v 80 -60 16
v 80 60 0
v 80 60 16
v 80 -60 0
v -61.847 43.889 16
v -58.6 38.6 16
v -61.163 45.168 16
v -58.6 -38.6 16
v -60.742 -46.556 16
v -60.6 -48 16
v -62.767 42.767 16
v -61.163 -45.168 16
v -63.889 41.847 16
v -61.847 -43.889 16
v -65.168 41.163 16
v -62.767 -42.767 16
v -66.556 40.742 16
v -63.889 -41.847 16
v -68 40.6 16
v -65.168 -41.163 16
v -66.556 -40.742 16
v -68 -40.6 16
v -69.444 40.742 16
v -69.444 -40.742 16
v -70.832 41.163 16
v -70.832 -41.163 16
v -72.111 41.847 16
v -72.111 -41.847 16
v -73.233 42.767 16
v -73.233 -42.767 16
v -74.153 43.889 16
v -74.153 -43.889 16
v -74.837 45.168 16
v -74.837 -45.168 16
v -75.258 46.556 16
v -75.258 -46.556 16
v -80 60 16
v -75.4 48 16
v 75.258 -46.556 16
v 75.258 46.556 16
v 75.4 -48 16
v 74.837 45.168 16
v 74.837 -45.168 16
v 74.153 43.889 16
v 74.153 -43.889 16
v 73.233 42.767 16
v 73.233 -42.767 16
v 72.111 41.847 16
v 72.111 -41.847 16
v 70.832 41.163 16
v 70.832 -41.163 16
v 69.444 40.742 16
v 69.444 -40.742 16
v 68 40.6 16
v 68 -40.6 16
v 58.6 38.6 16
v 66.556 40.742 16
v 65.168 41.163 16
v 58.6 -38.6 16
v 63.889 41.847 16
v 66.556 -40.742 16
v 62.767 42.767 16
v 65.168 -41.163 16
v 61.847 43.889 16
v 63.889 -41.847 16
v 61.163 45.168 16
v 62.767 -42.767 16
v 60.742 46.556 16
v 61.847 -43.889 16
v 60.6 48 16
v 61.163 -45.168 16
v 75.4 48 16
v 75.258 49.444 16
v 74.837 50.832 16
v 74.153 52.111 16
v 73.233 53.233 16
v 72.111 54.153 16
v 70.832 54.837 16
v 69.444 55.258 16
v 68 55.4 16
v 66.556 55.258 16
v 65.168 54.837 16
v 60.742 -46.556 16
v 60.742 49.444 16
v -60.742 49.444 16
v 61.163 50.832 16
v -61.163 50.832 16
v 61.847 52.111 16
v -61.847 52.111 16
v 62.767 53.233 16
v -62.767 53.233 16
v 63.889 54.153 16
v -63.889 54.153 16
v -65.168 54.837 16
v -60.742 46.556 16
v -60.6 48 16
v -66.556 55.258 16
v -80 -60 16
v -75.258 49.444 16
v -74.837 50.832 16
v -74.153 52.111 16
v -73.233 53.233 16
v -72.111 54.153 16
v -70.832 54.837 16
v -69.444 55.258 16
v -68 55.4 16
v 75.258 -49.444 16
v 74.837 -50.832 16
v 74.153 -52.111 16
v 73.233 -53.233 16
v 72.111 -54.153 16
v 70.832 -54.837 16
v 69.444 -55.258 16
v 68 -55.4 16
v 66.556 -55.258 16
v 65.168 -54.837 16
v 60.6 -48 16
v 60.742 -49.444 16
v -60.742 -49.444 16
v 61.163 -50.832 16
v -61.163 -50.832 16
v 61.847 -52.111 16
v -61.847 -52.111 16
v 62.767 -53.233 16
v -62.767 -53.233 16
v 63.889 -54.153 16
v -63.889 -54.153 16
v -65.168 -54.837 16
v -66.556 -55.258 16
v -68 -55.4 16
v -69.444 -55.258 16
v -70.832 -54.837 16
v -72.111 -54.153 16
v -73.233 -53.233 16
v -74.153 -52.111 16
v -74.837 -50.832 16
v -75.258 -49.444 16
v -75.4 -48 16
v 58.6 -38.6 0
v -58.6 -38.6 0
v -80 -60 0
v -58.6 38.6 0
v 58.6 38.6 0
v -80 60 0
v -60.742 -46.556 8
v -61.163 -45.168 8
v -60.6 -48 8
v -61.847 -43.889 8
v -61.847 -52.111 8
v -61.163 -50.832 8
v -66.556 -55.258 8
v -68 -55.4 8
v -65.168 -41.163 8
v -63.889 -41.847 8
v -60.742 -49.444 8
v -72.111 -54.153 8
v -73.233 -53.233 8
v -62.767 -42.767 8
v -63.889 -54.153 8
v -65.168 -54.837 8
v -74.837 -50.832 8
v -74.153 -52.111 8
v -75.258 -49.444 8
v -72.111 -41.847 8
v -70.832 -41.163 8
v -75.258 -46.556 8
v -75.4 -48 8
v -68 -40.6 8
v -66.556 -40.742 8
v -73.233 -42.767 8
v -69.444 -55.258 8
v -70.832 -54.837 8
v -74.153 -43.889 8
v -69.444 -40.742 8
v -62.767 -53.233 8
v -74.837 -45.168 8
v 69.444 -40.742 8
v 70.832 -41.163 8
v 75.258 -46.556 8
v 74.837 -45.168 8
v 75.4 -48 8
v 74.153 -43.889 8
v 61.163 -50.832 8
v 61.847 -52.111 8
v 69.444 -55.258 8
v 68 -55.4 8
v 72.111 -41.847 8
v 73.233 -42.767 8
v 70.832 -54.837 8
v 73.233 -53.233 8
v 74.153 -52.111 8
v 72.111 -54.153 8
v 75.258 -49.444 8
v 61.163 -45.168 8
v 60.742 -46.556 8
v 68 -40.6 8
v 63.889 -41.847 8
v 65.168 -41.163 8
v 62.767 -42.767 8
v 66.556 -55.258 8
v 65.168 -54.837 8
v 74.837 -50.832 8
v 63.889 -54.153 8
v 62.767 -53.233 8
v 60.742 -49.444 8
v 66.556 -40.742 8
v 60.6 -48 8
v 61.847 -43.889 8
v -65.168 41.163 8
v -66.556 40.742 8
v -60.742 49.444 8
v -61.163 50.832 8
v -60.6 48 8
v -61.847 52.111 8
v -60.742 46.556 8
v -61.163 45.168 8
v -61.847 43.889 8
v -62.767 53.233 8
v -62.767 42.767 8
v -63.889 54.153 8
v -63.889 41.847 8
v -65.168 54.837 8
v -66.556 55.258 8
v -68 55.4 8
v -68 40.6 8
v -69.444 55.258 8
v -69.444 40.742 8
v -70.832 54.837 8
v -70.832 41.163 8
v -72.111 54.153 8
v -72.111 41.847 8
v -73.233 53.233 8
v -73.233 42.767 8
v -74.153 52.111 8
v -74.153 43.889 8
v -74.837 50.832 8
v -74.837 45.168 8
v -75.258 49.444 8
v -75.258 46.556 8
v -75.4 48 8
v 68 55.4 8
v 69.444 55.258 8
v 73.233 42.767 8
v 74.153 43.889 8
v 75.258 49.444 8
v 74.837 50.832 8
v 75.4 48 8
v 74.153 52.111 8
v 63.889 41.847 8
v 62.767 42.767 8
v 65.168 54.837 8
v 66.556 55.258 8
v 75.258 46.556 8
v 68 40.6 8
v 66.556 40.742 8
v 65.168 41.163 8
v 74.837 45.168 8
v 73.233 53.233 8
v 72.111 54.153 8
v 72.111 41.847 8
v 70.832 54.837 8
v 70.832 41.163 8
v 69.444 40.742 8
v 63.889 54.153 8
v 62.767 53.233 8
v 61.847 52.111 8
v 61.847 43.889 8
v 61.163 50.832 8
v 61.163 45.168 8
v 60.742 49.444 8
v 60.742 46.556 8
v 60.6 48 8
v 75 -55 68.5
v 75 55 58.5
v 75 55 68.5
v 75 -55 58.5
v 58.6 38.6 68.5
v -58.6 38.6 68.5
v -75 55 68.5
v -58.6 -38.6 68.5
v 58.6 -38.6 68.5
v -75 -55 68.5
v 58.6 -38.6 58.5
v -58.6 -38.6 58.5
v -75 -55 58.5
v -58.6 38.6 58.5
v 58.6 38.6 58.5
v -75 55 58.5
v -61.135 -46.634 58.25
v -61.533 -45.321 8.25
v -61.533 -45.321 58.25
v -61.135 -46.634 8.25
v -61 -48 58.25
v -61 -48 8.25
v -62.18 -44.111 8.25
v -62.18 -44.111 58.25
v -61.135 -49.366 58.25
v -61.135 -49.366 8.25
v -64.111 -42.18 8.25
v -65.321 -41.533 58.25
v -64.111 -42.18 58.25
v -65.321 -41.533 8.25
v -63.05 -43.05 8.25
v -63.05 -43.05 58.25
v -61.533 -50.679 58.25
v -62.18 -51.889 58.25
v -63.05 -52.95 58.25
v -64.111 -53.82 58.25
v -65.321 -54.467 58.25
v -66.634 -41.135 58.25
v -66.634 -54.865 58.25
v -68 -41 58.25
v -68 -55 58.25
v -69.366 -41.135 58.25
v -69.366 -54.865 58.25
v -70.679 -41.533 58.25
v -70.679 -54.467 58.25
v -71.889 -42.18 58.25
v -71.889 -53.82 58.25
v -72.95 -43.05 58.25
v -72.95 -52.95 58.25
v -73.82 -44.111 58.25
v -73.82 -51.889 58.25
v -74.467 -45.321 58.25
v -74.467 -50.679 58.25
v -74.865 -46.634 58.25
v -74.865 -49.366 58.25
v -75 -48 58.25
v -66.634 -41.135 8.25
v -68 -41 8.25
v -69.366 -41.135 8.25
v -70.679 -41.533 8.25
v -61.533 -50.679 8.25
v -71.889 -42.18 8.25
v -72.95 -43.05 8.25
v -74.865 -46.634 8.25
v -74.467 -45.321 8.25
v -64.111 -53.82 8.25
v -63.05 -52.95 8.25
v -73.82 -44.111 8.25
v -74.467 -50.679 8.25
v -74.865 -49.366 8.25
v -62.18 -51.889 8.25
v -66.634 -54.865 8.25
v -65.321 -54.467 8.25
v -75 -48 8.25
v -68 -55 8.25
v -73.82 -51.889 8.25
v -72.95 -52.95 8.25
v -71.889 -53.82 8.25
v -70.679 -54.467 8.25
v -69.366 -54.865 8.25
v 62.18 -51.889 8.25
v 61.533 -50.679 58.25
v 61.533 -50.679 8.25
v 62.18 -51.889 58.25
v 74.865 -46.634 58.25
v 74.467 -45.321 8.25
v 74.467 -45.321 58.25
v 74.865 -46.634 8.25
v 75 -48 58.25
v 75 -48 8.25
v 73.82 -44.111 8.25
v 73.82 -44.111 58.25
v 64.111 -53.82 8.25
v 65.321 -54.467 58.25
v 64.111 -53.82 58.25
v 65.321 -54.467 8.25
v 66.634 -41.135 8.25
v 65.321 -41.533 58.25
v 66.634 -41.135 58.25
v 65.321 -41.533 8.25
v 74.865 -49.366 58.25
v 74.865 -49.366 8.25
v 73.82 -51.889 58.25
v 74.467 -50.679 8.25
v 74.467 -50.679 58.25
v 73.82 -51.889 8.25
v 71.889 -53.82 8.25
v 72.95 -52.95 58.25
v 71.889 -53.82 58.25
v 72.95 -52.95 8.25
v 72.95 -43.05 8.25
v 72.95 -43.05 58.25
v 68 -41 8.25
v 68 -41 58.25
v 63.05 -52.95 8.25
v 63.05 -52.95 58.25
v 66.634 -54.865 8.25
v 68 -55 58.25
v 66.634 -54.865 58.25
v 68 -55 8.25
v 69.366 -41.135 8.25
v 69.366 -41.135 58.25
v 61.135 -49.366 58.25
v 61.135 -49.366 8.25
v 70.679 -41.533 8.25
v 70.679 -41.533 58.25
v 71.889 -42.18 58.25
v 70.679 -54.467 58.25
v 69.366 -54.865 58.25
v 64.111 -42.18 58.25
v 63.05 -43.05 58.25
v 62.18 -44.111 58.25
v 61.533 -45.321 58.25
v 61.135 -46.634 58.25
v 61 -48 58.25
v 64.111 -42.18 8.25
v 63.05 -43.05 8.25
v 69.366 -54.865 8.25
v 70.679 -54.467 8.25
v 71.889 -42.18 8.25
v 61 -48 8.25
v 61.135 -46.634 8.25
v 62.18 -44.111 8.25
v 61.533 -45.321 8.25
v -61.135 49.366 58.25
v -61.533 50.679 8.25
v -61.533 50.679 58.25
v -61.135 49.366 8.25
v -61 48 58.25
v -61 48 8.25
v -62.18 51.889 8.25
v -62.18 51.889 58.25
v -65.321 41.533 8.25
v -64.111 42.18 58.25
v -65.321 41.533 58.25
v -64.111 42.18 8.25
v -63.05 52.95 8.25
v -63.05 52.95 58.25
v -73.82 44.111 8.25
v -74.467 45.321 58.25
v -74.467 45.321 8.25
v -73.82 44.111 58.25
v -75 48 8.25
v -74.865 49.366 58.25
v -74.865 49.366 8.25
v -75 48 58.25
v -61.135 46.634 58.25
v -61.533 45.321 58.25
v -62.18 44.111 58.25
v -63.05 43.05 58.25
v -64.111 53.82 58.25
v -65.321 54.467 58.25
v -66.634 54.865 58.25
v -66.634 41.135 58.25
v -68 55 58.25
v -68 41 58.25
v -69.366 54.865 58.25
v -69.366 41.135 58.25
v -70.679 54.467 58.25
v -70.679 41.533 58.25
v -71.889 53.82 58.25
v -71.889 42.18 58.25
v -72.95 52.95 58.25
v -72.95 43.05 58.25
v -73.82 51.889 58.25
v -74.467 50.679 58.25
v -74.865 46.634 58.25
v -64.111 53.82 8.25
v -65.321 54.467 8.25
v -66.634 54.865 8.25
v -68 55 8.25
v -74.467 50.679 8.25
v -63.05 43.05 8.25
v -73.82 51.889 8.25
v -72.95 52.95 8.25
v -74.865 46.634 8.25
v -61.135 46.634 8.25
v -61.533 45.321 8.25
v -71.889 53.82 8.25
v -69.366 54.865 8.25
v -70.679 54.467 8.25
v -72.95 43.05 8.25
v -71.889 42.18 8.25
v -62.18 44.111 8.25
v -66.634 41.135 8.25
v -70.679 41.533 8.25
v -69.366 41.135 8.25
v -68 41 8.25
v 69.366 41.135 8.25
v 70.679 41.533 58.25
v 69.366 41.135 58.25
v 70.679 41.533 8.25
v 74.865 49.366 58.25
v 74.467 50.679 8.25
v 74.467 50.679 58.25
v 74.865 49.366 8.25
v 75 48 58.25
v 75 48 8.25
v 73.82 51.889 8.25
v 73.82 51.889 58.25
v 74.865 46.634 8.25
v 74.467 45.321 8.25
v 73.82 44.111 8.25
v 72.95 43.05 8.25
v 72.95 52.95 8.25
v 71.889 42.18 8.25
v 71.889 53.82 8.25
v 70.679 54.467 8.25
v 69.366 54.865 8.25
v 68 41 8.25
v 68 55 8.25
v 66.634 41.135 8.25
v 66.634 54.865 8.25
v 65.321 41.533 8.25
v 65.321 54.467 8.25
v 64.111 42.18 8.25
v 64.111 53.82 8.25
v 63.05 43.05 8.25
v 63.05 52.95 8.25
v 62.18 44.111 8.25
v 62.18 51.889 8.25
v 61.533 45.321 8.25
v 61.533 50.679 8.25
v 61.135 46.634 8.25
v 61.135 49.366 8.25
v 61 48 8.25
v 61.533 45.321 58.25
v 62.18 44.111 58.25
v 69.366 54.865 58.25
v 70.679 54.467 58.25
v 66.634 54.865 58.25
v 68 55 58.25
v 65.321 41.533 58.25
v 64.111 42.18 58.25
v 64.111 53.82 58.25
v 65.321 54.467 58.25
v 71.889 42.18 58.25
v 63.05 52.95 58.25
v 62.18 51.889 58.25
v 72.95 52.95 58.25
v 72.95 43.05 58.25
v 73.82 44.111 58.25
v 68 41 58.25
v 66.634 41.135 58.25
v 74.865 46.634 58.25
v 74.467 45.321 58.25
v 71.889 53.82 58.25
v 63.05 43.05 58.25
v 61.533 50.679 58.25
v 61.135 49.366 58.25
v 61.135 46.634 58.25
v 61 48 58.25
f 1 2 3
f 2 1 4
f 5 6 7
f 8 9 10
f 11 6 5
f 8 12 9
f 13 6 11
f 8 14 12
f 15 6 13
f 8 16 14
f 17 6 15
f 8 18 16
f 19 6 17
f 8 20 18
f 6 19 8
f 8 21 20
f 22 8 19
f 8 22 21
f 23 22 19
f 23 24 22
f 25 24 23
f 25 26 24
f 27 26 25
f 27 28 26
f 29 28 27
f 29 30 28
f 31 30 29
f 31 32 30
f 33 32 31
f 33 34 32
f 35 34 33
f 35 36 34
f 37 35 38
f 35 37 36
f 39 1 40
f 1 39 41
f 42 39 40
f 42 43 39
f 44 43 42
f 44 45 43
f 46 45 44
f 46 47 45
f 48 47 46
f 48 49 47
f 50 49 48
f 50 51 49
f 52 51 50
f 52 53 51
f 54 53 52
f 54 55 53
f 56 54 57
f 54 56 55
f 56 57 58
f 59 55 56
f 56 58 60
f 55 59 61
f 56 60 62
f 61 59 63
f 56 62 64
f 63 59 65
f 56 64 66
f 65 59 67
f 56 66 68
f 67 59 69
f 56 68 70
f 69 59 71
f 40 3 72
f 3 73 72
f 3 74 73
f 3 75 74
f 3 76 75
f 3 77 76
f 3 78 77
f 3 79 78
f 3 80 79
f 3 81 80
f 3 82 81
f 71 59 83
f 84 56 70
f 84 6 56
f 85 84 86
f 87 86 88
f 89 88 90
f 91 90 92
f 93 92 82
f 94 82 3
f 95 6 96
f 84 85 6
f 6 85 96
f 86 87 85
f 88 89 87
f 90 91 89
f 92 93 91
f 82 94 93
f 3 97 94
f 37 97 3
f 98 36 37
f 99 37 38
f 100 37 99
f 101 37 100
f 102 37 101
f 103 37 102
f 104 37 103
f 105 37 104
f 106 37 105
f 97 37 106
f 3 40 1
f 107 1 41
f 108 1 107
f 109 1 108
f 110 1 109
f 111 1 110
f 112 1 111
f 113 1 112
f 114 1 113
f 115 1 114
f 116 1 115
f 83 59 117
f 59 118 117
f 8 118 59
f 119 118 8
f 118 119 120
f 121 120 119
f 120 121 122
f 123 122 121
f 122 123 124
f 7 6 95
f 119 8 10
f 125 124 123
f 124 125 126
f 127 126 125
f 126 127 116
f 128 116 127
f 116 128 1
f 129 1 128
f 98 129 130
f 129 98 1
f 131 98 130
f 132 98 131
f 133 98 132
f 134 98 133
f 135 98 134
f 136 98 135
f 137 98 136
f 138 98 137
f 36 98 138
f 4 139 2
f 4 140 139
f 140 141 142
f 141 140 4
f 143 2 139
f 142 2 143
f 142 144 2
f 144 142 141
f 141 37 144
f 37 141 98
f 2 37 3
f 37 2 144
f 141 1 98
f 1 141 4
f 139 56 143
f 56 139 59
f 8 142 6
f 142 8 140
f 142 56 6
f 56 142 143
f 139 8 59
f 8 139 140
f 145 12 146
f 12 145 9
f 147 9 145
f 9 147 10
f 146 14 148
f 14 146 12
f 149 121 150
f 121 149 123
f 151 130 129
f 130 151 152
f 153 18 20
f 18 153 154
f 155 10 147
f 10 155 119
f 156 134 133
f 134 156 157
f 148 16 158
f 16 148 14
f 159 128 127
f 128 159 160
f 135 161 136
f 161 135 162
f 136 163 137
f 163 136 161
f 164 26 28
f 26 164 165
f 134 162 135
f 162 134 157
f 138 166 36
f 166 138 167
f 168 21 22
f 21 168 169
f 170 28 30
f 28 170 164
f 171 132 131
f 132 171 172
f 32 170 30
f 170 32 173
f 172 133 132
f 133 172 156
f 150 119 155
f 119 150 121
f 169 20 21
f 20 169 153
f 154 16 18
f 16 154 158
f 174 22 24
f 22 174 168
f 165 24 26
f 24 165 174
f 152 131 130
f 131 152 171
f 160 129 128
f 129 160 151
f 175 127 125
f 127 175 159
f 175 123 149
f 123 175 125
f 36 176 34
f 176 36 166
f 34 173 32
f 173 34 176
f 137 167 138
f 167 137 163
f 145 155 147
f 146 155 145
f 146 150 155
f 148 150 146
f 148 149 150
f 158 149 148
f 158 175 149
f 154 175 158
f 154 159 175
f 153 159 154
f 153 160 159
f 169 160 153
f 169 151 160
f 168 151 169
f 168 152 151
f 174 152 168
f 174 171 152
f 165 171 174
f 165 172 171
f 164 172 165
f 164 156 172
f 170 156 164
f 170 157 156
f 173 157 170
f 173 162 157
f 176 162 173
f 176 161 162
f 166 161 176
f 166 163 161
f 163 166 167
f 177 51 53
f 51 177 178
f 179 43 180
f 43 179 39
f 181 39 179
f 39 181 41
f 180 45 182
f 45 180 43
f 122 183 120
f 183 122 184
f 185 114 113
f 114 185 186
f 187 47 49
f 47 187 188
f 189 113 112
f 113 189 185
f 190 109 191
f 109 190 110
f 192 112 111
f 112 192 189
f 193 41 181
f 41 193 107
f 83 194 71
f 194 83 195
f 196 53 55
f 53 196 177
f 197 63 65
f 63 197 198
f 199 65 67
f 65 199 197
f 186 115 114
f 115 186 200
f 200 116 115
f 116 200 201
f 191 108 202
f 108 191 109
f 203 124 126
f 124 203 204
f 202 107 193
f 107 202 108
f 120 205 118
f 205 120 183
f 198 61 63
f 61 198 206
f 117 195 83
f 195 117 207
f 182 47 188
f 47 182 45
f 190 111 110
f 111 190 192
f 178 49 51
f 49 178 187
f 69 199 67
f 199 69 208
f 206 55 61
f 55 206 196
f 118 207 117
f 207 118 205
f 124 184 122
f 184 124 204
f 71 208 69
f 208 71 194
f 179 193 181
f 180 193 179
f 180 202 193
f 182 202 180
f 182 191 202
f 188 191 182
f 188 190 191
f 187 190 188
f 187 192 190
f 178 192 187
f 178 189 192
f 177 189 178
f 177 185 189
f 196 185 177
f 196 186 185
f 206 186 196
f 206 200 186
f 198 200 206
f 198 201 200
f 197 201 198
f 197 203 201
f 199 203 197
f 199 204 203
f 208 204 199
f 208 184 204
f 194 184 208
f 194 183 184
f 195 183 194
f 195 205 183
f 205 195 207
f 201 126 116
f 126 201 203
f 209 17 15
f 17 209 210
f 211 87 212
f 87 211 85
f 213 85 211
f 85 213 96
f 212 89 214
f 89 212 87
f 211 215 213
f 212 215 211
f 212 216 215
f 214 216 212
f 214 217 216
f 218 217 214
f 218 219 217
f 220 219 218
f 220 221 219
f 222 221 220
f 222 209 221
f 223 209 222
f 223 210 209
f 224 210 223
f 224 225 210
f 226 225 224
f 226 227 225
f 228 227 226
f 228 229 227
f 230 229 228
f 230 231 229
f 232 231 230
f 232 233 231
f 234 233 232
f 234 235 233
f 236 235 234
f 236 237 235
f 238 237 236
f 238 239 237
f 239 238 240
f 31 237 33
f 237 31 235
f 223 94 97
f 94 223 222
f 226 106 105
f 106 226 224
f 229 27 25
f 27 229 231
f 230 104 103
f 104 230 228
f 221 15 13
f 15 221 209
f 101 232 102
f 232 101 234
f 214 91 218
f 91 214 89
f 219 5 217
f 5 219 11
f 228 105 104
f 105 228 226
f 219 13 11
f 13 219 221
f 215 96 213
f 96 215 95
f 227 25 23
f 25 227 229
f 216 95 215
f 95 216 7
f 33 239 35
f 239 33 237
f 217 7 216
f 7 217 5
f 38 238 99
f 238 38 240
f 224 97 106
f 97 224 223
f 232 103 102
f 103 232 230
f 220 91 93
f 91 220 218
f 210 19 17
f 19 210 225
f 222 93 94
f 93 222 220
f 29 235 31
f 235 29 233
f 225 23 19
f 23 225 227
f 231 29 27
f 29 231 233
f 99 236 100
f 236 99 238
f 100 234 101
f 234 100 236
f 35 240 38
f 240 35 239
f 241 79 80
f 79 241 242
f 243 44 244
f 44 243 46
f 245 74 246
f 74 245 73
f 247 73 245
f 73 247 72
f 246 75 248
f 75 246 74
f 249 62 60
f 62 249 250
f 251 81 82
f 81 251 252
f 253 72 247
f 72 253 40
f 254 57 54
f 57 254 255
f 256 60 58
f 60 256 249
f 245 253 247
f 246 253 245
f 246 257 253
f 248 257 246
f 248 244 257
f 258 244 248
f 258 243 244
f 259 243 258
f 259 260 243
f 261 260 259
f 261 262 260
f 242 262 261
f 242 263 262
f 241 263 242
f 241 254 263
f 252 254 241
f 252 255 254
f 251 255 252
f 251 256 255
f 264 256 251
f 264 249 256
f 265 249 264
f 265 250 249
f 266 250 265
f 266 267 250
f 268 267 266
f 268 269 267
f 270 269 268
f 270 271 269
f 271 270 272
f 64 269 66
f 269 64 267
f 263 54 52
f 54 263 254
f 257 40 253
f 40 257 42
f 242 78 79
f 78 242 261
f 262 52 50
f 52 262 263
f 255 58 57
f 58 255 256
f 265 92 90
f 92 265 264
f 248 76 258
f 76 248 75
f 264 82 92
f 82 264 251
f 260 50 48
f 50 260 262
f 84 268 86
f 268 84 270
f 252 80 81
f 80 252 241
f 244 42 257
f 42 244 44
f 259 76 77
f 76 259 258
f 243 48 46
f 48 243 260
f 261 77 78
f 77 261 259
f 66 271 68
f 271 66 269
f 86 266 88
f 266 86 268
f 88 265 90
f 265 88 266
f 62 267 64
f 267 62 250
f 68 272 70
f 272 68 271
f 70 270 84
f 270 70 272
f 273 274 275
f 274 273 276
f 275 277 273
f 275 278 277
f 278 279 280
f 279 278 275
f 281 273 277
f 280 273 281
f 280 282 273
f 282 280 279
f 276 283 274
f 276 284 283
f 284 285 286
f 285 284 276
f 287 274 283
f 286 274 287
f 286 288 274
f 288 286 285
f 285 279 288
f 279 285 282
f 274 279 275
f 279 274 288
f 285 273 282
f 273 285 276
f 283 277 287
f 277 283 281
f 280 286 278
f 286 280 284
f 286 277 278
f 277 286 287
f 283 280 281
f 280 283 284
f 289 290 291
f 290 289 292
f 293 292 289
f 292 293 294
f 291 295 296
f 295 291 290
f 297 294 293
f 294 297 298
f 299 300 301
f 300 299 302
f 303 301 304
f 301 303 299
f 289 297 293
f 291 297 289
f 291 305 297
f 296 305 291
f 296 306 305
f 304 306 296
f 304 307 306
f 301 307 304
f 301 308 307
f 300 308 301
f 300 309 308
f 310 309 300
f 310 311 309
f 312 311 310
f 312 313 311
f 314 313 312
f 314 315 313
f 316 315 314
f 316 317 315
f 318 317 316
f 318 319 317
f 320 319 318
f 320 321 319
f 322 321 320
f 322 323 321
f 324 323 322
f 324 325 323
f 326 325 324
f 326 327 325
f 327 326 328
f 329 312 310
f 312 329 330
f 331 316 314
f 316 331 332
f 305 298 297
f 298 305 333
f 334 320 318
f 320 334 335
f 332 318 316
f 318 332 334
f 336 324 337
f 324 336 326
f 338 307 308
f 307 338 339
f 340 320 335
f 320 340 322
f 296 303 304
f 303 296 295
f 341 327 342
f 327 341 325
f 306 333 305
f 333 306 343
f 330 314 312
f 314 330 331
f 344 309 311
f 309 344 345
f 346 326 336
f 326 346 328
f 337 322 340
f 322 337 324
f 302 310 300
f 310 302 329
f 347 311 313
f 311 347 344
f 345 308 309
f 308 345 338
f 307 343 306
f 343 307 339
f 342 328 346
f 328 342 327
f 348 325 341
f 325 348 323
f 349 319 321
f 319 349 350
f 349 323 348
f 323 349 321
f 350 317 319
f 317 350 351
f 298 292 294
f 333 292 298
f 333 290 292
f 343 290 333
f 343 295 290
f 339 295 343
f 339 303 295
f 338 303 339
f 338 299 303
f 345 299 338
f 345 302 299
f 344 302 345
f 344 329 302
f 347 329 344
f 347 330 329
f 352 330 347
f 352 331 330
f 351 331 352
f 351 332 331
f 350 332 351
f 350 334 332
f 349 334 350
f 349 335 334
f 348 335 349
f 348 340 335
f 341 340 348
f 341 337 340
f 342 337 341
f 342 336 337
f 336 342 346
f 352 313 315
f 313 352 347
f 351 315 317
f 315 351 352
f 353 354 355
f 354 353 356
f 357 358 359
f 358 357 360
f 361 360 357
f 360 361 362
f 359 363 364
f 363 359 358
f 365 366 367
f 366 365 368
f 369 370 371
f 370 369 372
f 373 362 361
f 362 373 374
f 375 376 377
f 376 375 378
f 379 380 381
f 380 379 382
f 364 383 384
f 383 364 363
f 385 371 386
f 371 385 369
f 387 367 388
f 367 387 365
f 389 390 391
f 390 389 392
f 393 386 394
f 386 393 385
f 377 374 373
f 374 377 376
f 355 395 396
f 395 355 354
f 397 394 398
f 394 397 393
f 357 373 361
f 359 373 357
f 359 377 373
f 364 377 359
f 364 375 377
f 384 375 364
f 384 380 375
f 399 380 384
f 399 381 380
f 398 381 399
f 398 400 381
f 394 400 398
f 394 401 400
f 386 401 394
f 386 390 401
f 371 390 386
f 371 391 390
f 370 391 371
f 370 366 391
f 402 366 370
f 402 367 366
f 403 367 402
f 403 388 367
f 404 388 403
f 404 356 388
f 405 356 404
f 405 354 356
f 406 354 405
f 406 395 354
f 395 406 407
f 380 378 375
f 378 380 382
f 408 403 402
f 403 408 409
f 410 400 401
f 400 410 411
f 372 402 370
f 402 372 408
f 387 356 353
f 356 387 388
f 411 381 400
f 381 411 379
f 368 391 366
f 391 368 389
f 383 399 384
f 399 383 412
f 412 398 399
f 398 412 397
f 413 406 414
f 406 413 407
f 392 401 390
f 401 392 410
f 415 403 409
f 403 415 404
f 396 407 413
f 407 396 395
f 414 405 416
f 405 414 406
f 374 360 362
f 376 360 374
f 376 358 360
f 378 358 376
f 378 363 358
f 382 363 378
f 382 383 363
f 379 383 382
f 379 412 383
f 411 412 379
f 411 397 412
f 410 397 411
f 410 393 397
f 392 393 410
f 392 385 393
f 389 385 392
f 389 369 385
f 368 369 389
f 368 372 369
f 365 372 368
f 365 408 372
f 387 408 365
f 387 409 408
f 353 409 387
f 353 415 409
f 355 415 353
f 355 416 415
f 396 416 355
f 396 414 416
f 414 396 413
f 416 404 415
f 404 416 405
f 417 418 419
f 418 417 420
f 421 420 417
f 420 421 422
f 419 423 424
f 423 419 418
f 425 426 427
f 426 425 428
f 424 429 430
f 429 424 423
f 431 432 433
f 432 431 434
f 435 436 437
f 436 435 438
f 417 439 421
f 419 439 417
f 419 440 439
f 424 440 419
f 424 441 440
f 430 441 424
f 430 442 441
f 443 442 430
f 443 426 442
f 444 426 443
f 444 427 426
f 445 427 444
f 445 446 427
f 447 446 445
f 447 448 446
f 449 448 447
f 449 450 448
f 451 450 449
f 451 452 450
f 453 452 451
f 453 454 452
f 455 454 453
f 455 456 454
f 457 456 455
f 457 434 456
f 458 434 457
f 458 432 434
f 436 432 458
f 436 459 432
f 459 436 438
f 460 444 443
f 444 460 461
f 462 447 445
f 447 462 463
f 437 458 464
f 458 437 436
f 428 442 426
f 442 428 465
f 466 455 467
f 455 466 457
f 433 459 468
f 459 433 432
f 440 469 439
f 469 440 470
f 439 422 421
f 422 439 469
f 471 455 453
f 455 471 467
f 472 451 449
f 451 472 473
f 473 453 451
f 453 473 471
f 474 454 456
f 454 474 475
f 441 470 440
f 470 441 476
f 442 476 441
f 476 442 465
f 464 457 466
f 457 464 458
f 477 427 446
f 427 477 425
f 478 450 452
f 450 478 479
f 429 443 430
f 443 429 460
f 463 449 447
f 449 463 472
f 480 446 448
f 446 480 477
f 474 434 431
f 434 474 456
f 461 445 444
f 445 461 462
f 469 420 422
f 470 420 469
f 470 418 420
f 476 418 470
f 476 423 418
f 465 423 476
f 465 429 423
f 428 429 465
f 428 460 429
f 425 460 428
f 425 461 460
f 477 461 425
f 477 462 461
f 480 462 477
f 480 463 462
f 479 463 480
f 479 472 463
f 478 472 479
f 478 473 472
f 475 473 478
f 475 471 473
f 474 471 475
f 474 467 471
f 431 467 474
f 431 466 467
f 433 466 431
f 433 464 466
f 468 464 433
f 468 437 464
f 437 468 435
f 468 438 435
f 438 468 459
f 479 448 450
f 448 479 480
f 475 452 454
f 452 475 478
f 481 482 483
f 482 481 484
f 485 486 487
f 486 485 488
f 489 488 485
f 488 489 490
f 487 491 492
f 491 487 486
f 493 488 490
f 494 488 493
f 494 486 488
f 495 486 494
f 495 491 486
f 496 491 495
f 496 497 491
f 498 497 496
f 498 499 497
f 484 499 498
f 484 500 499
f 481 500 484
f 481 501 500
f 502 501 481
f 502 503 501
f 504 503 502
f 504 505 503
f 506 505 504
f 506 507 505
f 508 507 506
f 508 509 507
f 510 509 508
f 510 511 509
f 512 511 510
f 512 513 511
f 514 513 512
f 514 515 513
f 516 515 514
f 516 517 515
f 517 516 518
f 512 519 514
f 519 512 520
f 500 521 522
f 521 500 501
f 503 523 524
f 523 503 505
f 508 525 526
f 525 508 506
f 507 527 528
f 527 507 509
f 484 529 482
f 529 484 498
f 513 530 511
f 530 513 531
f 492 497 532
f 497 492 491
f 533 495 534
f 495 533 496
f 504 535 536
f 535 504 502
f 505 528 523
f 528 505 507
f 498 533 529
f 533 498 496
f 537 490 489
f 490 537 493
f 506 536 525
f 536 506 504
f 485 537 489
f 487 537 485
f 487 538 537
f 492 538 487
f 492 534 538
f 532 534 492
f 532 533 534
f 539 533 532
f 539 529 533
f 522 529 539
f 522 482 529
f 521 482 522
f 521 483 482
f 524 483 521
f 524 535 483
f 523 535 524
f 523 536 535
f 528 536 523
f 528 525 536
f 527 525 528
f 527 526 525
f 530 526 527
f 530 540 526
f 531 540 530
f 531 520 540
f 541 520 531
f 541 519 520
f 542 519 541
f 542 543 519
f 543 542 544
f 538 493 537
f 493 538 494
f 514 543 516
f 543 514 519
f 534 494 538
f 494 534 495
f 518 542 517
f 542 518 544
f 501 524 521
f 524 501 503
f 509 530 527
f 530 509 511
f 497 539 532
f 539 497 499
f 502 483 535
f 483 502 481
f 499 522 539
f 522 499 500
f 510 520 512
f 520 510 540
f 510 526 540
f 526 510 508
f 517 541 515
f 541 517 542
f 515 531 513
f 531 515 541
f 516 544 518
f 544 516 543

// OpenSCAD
$fn = 32;

// ------------------------------------------------------------------------
// Frame cube: base 160 x 120 mm, posts 50 mm tall
// Every part is its own module, assembly() places every instance.
// ------------------------------------------------------------------------

// --- part 1 ---
module base_frame() {
  difference() {
    translate([-80, -60, 0]) cube([160, 120, 16]);
    translate([-58.6, -38.6, -1]) cube([117.2, 77.2, 18]);
    translate([-68, -48, 8]) cylinder(h = 9, d = 14.8);
    translate([68, -48, 8]) cylinder(h = 9, d = 14.8);
    translate([-68, 48, 8]) cylinder(h = 9, d = 14.8);
    translate([68, 48, 8]) cylinder(h = 9, d = 14.8);
  }
}

// --- part 2 ---
module corner_post() {
  cylinder(h = 50, d = 14);
}

// --- part 3 ---
module top_frame() {
  difference() {
    translate([-75, -55, 0]) cube([150, 110, 10]);
    translate([-58.6, -38.6, -1]) cube([117.2, 77.2, 12]);
  }
}

// --- assembly ---
module assembly() {
  color([0.80, 0.24, 0.20]) translate([0, 0, 0]) rotate([0, 0, 0]) base_frame();
  color([0.20, 0.45, 0.75]) translate([-68, -48, 8.25]) rotate([0, 0, 0]) corner_post();
  color([0.25, 0.62, 0.32]) translate([68, -48, 8.25]) rotate([0, 0, 0]) corner_post();
  color([0.92, 0.70, 0.18]) translate([-68, 48, 8.25]) rotate([0, 0, 0]) corner_post();
  color([0.58, 0.35, 0.70]) translate([68, 48, 8.25]) rotate([0, 0, 0]) corner_post();
  color([0.16, 0.66, 0.66]) translate([0, 0, 58.5]) rotate([0, 0, 0]) top_frame();
}

assembly();
